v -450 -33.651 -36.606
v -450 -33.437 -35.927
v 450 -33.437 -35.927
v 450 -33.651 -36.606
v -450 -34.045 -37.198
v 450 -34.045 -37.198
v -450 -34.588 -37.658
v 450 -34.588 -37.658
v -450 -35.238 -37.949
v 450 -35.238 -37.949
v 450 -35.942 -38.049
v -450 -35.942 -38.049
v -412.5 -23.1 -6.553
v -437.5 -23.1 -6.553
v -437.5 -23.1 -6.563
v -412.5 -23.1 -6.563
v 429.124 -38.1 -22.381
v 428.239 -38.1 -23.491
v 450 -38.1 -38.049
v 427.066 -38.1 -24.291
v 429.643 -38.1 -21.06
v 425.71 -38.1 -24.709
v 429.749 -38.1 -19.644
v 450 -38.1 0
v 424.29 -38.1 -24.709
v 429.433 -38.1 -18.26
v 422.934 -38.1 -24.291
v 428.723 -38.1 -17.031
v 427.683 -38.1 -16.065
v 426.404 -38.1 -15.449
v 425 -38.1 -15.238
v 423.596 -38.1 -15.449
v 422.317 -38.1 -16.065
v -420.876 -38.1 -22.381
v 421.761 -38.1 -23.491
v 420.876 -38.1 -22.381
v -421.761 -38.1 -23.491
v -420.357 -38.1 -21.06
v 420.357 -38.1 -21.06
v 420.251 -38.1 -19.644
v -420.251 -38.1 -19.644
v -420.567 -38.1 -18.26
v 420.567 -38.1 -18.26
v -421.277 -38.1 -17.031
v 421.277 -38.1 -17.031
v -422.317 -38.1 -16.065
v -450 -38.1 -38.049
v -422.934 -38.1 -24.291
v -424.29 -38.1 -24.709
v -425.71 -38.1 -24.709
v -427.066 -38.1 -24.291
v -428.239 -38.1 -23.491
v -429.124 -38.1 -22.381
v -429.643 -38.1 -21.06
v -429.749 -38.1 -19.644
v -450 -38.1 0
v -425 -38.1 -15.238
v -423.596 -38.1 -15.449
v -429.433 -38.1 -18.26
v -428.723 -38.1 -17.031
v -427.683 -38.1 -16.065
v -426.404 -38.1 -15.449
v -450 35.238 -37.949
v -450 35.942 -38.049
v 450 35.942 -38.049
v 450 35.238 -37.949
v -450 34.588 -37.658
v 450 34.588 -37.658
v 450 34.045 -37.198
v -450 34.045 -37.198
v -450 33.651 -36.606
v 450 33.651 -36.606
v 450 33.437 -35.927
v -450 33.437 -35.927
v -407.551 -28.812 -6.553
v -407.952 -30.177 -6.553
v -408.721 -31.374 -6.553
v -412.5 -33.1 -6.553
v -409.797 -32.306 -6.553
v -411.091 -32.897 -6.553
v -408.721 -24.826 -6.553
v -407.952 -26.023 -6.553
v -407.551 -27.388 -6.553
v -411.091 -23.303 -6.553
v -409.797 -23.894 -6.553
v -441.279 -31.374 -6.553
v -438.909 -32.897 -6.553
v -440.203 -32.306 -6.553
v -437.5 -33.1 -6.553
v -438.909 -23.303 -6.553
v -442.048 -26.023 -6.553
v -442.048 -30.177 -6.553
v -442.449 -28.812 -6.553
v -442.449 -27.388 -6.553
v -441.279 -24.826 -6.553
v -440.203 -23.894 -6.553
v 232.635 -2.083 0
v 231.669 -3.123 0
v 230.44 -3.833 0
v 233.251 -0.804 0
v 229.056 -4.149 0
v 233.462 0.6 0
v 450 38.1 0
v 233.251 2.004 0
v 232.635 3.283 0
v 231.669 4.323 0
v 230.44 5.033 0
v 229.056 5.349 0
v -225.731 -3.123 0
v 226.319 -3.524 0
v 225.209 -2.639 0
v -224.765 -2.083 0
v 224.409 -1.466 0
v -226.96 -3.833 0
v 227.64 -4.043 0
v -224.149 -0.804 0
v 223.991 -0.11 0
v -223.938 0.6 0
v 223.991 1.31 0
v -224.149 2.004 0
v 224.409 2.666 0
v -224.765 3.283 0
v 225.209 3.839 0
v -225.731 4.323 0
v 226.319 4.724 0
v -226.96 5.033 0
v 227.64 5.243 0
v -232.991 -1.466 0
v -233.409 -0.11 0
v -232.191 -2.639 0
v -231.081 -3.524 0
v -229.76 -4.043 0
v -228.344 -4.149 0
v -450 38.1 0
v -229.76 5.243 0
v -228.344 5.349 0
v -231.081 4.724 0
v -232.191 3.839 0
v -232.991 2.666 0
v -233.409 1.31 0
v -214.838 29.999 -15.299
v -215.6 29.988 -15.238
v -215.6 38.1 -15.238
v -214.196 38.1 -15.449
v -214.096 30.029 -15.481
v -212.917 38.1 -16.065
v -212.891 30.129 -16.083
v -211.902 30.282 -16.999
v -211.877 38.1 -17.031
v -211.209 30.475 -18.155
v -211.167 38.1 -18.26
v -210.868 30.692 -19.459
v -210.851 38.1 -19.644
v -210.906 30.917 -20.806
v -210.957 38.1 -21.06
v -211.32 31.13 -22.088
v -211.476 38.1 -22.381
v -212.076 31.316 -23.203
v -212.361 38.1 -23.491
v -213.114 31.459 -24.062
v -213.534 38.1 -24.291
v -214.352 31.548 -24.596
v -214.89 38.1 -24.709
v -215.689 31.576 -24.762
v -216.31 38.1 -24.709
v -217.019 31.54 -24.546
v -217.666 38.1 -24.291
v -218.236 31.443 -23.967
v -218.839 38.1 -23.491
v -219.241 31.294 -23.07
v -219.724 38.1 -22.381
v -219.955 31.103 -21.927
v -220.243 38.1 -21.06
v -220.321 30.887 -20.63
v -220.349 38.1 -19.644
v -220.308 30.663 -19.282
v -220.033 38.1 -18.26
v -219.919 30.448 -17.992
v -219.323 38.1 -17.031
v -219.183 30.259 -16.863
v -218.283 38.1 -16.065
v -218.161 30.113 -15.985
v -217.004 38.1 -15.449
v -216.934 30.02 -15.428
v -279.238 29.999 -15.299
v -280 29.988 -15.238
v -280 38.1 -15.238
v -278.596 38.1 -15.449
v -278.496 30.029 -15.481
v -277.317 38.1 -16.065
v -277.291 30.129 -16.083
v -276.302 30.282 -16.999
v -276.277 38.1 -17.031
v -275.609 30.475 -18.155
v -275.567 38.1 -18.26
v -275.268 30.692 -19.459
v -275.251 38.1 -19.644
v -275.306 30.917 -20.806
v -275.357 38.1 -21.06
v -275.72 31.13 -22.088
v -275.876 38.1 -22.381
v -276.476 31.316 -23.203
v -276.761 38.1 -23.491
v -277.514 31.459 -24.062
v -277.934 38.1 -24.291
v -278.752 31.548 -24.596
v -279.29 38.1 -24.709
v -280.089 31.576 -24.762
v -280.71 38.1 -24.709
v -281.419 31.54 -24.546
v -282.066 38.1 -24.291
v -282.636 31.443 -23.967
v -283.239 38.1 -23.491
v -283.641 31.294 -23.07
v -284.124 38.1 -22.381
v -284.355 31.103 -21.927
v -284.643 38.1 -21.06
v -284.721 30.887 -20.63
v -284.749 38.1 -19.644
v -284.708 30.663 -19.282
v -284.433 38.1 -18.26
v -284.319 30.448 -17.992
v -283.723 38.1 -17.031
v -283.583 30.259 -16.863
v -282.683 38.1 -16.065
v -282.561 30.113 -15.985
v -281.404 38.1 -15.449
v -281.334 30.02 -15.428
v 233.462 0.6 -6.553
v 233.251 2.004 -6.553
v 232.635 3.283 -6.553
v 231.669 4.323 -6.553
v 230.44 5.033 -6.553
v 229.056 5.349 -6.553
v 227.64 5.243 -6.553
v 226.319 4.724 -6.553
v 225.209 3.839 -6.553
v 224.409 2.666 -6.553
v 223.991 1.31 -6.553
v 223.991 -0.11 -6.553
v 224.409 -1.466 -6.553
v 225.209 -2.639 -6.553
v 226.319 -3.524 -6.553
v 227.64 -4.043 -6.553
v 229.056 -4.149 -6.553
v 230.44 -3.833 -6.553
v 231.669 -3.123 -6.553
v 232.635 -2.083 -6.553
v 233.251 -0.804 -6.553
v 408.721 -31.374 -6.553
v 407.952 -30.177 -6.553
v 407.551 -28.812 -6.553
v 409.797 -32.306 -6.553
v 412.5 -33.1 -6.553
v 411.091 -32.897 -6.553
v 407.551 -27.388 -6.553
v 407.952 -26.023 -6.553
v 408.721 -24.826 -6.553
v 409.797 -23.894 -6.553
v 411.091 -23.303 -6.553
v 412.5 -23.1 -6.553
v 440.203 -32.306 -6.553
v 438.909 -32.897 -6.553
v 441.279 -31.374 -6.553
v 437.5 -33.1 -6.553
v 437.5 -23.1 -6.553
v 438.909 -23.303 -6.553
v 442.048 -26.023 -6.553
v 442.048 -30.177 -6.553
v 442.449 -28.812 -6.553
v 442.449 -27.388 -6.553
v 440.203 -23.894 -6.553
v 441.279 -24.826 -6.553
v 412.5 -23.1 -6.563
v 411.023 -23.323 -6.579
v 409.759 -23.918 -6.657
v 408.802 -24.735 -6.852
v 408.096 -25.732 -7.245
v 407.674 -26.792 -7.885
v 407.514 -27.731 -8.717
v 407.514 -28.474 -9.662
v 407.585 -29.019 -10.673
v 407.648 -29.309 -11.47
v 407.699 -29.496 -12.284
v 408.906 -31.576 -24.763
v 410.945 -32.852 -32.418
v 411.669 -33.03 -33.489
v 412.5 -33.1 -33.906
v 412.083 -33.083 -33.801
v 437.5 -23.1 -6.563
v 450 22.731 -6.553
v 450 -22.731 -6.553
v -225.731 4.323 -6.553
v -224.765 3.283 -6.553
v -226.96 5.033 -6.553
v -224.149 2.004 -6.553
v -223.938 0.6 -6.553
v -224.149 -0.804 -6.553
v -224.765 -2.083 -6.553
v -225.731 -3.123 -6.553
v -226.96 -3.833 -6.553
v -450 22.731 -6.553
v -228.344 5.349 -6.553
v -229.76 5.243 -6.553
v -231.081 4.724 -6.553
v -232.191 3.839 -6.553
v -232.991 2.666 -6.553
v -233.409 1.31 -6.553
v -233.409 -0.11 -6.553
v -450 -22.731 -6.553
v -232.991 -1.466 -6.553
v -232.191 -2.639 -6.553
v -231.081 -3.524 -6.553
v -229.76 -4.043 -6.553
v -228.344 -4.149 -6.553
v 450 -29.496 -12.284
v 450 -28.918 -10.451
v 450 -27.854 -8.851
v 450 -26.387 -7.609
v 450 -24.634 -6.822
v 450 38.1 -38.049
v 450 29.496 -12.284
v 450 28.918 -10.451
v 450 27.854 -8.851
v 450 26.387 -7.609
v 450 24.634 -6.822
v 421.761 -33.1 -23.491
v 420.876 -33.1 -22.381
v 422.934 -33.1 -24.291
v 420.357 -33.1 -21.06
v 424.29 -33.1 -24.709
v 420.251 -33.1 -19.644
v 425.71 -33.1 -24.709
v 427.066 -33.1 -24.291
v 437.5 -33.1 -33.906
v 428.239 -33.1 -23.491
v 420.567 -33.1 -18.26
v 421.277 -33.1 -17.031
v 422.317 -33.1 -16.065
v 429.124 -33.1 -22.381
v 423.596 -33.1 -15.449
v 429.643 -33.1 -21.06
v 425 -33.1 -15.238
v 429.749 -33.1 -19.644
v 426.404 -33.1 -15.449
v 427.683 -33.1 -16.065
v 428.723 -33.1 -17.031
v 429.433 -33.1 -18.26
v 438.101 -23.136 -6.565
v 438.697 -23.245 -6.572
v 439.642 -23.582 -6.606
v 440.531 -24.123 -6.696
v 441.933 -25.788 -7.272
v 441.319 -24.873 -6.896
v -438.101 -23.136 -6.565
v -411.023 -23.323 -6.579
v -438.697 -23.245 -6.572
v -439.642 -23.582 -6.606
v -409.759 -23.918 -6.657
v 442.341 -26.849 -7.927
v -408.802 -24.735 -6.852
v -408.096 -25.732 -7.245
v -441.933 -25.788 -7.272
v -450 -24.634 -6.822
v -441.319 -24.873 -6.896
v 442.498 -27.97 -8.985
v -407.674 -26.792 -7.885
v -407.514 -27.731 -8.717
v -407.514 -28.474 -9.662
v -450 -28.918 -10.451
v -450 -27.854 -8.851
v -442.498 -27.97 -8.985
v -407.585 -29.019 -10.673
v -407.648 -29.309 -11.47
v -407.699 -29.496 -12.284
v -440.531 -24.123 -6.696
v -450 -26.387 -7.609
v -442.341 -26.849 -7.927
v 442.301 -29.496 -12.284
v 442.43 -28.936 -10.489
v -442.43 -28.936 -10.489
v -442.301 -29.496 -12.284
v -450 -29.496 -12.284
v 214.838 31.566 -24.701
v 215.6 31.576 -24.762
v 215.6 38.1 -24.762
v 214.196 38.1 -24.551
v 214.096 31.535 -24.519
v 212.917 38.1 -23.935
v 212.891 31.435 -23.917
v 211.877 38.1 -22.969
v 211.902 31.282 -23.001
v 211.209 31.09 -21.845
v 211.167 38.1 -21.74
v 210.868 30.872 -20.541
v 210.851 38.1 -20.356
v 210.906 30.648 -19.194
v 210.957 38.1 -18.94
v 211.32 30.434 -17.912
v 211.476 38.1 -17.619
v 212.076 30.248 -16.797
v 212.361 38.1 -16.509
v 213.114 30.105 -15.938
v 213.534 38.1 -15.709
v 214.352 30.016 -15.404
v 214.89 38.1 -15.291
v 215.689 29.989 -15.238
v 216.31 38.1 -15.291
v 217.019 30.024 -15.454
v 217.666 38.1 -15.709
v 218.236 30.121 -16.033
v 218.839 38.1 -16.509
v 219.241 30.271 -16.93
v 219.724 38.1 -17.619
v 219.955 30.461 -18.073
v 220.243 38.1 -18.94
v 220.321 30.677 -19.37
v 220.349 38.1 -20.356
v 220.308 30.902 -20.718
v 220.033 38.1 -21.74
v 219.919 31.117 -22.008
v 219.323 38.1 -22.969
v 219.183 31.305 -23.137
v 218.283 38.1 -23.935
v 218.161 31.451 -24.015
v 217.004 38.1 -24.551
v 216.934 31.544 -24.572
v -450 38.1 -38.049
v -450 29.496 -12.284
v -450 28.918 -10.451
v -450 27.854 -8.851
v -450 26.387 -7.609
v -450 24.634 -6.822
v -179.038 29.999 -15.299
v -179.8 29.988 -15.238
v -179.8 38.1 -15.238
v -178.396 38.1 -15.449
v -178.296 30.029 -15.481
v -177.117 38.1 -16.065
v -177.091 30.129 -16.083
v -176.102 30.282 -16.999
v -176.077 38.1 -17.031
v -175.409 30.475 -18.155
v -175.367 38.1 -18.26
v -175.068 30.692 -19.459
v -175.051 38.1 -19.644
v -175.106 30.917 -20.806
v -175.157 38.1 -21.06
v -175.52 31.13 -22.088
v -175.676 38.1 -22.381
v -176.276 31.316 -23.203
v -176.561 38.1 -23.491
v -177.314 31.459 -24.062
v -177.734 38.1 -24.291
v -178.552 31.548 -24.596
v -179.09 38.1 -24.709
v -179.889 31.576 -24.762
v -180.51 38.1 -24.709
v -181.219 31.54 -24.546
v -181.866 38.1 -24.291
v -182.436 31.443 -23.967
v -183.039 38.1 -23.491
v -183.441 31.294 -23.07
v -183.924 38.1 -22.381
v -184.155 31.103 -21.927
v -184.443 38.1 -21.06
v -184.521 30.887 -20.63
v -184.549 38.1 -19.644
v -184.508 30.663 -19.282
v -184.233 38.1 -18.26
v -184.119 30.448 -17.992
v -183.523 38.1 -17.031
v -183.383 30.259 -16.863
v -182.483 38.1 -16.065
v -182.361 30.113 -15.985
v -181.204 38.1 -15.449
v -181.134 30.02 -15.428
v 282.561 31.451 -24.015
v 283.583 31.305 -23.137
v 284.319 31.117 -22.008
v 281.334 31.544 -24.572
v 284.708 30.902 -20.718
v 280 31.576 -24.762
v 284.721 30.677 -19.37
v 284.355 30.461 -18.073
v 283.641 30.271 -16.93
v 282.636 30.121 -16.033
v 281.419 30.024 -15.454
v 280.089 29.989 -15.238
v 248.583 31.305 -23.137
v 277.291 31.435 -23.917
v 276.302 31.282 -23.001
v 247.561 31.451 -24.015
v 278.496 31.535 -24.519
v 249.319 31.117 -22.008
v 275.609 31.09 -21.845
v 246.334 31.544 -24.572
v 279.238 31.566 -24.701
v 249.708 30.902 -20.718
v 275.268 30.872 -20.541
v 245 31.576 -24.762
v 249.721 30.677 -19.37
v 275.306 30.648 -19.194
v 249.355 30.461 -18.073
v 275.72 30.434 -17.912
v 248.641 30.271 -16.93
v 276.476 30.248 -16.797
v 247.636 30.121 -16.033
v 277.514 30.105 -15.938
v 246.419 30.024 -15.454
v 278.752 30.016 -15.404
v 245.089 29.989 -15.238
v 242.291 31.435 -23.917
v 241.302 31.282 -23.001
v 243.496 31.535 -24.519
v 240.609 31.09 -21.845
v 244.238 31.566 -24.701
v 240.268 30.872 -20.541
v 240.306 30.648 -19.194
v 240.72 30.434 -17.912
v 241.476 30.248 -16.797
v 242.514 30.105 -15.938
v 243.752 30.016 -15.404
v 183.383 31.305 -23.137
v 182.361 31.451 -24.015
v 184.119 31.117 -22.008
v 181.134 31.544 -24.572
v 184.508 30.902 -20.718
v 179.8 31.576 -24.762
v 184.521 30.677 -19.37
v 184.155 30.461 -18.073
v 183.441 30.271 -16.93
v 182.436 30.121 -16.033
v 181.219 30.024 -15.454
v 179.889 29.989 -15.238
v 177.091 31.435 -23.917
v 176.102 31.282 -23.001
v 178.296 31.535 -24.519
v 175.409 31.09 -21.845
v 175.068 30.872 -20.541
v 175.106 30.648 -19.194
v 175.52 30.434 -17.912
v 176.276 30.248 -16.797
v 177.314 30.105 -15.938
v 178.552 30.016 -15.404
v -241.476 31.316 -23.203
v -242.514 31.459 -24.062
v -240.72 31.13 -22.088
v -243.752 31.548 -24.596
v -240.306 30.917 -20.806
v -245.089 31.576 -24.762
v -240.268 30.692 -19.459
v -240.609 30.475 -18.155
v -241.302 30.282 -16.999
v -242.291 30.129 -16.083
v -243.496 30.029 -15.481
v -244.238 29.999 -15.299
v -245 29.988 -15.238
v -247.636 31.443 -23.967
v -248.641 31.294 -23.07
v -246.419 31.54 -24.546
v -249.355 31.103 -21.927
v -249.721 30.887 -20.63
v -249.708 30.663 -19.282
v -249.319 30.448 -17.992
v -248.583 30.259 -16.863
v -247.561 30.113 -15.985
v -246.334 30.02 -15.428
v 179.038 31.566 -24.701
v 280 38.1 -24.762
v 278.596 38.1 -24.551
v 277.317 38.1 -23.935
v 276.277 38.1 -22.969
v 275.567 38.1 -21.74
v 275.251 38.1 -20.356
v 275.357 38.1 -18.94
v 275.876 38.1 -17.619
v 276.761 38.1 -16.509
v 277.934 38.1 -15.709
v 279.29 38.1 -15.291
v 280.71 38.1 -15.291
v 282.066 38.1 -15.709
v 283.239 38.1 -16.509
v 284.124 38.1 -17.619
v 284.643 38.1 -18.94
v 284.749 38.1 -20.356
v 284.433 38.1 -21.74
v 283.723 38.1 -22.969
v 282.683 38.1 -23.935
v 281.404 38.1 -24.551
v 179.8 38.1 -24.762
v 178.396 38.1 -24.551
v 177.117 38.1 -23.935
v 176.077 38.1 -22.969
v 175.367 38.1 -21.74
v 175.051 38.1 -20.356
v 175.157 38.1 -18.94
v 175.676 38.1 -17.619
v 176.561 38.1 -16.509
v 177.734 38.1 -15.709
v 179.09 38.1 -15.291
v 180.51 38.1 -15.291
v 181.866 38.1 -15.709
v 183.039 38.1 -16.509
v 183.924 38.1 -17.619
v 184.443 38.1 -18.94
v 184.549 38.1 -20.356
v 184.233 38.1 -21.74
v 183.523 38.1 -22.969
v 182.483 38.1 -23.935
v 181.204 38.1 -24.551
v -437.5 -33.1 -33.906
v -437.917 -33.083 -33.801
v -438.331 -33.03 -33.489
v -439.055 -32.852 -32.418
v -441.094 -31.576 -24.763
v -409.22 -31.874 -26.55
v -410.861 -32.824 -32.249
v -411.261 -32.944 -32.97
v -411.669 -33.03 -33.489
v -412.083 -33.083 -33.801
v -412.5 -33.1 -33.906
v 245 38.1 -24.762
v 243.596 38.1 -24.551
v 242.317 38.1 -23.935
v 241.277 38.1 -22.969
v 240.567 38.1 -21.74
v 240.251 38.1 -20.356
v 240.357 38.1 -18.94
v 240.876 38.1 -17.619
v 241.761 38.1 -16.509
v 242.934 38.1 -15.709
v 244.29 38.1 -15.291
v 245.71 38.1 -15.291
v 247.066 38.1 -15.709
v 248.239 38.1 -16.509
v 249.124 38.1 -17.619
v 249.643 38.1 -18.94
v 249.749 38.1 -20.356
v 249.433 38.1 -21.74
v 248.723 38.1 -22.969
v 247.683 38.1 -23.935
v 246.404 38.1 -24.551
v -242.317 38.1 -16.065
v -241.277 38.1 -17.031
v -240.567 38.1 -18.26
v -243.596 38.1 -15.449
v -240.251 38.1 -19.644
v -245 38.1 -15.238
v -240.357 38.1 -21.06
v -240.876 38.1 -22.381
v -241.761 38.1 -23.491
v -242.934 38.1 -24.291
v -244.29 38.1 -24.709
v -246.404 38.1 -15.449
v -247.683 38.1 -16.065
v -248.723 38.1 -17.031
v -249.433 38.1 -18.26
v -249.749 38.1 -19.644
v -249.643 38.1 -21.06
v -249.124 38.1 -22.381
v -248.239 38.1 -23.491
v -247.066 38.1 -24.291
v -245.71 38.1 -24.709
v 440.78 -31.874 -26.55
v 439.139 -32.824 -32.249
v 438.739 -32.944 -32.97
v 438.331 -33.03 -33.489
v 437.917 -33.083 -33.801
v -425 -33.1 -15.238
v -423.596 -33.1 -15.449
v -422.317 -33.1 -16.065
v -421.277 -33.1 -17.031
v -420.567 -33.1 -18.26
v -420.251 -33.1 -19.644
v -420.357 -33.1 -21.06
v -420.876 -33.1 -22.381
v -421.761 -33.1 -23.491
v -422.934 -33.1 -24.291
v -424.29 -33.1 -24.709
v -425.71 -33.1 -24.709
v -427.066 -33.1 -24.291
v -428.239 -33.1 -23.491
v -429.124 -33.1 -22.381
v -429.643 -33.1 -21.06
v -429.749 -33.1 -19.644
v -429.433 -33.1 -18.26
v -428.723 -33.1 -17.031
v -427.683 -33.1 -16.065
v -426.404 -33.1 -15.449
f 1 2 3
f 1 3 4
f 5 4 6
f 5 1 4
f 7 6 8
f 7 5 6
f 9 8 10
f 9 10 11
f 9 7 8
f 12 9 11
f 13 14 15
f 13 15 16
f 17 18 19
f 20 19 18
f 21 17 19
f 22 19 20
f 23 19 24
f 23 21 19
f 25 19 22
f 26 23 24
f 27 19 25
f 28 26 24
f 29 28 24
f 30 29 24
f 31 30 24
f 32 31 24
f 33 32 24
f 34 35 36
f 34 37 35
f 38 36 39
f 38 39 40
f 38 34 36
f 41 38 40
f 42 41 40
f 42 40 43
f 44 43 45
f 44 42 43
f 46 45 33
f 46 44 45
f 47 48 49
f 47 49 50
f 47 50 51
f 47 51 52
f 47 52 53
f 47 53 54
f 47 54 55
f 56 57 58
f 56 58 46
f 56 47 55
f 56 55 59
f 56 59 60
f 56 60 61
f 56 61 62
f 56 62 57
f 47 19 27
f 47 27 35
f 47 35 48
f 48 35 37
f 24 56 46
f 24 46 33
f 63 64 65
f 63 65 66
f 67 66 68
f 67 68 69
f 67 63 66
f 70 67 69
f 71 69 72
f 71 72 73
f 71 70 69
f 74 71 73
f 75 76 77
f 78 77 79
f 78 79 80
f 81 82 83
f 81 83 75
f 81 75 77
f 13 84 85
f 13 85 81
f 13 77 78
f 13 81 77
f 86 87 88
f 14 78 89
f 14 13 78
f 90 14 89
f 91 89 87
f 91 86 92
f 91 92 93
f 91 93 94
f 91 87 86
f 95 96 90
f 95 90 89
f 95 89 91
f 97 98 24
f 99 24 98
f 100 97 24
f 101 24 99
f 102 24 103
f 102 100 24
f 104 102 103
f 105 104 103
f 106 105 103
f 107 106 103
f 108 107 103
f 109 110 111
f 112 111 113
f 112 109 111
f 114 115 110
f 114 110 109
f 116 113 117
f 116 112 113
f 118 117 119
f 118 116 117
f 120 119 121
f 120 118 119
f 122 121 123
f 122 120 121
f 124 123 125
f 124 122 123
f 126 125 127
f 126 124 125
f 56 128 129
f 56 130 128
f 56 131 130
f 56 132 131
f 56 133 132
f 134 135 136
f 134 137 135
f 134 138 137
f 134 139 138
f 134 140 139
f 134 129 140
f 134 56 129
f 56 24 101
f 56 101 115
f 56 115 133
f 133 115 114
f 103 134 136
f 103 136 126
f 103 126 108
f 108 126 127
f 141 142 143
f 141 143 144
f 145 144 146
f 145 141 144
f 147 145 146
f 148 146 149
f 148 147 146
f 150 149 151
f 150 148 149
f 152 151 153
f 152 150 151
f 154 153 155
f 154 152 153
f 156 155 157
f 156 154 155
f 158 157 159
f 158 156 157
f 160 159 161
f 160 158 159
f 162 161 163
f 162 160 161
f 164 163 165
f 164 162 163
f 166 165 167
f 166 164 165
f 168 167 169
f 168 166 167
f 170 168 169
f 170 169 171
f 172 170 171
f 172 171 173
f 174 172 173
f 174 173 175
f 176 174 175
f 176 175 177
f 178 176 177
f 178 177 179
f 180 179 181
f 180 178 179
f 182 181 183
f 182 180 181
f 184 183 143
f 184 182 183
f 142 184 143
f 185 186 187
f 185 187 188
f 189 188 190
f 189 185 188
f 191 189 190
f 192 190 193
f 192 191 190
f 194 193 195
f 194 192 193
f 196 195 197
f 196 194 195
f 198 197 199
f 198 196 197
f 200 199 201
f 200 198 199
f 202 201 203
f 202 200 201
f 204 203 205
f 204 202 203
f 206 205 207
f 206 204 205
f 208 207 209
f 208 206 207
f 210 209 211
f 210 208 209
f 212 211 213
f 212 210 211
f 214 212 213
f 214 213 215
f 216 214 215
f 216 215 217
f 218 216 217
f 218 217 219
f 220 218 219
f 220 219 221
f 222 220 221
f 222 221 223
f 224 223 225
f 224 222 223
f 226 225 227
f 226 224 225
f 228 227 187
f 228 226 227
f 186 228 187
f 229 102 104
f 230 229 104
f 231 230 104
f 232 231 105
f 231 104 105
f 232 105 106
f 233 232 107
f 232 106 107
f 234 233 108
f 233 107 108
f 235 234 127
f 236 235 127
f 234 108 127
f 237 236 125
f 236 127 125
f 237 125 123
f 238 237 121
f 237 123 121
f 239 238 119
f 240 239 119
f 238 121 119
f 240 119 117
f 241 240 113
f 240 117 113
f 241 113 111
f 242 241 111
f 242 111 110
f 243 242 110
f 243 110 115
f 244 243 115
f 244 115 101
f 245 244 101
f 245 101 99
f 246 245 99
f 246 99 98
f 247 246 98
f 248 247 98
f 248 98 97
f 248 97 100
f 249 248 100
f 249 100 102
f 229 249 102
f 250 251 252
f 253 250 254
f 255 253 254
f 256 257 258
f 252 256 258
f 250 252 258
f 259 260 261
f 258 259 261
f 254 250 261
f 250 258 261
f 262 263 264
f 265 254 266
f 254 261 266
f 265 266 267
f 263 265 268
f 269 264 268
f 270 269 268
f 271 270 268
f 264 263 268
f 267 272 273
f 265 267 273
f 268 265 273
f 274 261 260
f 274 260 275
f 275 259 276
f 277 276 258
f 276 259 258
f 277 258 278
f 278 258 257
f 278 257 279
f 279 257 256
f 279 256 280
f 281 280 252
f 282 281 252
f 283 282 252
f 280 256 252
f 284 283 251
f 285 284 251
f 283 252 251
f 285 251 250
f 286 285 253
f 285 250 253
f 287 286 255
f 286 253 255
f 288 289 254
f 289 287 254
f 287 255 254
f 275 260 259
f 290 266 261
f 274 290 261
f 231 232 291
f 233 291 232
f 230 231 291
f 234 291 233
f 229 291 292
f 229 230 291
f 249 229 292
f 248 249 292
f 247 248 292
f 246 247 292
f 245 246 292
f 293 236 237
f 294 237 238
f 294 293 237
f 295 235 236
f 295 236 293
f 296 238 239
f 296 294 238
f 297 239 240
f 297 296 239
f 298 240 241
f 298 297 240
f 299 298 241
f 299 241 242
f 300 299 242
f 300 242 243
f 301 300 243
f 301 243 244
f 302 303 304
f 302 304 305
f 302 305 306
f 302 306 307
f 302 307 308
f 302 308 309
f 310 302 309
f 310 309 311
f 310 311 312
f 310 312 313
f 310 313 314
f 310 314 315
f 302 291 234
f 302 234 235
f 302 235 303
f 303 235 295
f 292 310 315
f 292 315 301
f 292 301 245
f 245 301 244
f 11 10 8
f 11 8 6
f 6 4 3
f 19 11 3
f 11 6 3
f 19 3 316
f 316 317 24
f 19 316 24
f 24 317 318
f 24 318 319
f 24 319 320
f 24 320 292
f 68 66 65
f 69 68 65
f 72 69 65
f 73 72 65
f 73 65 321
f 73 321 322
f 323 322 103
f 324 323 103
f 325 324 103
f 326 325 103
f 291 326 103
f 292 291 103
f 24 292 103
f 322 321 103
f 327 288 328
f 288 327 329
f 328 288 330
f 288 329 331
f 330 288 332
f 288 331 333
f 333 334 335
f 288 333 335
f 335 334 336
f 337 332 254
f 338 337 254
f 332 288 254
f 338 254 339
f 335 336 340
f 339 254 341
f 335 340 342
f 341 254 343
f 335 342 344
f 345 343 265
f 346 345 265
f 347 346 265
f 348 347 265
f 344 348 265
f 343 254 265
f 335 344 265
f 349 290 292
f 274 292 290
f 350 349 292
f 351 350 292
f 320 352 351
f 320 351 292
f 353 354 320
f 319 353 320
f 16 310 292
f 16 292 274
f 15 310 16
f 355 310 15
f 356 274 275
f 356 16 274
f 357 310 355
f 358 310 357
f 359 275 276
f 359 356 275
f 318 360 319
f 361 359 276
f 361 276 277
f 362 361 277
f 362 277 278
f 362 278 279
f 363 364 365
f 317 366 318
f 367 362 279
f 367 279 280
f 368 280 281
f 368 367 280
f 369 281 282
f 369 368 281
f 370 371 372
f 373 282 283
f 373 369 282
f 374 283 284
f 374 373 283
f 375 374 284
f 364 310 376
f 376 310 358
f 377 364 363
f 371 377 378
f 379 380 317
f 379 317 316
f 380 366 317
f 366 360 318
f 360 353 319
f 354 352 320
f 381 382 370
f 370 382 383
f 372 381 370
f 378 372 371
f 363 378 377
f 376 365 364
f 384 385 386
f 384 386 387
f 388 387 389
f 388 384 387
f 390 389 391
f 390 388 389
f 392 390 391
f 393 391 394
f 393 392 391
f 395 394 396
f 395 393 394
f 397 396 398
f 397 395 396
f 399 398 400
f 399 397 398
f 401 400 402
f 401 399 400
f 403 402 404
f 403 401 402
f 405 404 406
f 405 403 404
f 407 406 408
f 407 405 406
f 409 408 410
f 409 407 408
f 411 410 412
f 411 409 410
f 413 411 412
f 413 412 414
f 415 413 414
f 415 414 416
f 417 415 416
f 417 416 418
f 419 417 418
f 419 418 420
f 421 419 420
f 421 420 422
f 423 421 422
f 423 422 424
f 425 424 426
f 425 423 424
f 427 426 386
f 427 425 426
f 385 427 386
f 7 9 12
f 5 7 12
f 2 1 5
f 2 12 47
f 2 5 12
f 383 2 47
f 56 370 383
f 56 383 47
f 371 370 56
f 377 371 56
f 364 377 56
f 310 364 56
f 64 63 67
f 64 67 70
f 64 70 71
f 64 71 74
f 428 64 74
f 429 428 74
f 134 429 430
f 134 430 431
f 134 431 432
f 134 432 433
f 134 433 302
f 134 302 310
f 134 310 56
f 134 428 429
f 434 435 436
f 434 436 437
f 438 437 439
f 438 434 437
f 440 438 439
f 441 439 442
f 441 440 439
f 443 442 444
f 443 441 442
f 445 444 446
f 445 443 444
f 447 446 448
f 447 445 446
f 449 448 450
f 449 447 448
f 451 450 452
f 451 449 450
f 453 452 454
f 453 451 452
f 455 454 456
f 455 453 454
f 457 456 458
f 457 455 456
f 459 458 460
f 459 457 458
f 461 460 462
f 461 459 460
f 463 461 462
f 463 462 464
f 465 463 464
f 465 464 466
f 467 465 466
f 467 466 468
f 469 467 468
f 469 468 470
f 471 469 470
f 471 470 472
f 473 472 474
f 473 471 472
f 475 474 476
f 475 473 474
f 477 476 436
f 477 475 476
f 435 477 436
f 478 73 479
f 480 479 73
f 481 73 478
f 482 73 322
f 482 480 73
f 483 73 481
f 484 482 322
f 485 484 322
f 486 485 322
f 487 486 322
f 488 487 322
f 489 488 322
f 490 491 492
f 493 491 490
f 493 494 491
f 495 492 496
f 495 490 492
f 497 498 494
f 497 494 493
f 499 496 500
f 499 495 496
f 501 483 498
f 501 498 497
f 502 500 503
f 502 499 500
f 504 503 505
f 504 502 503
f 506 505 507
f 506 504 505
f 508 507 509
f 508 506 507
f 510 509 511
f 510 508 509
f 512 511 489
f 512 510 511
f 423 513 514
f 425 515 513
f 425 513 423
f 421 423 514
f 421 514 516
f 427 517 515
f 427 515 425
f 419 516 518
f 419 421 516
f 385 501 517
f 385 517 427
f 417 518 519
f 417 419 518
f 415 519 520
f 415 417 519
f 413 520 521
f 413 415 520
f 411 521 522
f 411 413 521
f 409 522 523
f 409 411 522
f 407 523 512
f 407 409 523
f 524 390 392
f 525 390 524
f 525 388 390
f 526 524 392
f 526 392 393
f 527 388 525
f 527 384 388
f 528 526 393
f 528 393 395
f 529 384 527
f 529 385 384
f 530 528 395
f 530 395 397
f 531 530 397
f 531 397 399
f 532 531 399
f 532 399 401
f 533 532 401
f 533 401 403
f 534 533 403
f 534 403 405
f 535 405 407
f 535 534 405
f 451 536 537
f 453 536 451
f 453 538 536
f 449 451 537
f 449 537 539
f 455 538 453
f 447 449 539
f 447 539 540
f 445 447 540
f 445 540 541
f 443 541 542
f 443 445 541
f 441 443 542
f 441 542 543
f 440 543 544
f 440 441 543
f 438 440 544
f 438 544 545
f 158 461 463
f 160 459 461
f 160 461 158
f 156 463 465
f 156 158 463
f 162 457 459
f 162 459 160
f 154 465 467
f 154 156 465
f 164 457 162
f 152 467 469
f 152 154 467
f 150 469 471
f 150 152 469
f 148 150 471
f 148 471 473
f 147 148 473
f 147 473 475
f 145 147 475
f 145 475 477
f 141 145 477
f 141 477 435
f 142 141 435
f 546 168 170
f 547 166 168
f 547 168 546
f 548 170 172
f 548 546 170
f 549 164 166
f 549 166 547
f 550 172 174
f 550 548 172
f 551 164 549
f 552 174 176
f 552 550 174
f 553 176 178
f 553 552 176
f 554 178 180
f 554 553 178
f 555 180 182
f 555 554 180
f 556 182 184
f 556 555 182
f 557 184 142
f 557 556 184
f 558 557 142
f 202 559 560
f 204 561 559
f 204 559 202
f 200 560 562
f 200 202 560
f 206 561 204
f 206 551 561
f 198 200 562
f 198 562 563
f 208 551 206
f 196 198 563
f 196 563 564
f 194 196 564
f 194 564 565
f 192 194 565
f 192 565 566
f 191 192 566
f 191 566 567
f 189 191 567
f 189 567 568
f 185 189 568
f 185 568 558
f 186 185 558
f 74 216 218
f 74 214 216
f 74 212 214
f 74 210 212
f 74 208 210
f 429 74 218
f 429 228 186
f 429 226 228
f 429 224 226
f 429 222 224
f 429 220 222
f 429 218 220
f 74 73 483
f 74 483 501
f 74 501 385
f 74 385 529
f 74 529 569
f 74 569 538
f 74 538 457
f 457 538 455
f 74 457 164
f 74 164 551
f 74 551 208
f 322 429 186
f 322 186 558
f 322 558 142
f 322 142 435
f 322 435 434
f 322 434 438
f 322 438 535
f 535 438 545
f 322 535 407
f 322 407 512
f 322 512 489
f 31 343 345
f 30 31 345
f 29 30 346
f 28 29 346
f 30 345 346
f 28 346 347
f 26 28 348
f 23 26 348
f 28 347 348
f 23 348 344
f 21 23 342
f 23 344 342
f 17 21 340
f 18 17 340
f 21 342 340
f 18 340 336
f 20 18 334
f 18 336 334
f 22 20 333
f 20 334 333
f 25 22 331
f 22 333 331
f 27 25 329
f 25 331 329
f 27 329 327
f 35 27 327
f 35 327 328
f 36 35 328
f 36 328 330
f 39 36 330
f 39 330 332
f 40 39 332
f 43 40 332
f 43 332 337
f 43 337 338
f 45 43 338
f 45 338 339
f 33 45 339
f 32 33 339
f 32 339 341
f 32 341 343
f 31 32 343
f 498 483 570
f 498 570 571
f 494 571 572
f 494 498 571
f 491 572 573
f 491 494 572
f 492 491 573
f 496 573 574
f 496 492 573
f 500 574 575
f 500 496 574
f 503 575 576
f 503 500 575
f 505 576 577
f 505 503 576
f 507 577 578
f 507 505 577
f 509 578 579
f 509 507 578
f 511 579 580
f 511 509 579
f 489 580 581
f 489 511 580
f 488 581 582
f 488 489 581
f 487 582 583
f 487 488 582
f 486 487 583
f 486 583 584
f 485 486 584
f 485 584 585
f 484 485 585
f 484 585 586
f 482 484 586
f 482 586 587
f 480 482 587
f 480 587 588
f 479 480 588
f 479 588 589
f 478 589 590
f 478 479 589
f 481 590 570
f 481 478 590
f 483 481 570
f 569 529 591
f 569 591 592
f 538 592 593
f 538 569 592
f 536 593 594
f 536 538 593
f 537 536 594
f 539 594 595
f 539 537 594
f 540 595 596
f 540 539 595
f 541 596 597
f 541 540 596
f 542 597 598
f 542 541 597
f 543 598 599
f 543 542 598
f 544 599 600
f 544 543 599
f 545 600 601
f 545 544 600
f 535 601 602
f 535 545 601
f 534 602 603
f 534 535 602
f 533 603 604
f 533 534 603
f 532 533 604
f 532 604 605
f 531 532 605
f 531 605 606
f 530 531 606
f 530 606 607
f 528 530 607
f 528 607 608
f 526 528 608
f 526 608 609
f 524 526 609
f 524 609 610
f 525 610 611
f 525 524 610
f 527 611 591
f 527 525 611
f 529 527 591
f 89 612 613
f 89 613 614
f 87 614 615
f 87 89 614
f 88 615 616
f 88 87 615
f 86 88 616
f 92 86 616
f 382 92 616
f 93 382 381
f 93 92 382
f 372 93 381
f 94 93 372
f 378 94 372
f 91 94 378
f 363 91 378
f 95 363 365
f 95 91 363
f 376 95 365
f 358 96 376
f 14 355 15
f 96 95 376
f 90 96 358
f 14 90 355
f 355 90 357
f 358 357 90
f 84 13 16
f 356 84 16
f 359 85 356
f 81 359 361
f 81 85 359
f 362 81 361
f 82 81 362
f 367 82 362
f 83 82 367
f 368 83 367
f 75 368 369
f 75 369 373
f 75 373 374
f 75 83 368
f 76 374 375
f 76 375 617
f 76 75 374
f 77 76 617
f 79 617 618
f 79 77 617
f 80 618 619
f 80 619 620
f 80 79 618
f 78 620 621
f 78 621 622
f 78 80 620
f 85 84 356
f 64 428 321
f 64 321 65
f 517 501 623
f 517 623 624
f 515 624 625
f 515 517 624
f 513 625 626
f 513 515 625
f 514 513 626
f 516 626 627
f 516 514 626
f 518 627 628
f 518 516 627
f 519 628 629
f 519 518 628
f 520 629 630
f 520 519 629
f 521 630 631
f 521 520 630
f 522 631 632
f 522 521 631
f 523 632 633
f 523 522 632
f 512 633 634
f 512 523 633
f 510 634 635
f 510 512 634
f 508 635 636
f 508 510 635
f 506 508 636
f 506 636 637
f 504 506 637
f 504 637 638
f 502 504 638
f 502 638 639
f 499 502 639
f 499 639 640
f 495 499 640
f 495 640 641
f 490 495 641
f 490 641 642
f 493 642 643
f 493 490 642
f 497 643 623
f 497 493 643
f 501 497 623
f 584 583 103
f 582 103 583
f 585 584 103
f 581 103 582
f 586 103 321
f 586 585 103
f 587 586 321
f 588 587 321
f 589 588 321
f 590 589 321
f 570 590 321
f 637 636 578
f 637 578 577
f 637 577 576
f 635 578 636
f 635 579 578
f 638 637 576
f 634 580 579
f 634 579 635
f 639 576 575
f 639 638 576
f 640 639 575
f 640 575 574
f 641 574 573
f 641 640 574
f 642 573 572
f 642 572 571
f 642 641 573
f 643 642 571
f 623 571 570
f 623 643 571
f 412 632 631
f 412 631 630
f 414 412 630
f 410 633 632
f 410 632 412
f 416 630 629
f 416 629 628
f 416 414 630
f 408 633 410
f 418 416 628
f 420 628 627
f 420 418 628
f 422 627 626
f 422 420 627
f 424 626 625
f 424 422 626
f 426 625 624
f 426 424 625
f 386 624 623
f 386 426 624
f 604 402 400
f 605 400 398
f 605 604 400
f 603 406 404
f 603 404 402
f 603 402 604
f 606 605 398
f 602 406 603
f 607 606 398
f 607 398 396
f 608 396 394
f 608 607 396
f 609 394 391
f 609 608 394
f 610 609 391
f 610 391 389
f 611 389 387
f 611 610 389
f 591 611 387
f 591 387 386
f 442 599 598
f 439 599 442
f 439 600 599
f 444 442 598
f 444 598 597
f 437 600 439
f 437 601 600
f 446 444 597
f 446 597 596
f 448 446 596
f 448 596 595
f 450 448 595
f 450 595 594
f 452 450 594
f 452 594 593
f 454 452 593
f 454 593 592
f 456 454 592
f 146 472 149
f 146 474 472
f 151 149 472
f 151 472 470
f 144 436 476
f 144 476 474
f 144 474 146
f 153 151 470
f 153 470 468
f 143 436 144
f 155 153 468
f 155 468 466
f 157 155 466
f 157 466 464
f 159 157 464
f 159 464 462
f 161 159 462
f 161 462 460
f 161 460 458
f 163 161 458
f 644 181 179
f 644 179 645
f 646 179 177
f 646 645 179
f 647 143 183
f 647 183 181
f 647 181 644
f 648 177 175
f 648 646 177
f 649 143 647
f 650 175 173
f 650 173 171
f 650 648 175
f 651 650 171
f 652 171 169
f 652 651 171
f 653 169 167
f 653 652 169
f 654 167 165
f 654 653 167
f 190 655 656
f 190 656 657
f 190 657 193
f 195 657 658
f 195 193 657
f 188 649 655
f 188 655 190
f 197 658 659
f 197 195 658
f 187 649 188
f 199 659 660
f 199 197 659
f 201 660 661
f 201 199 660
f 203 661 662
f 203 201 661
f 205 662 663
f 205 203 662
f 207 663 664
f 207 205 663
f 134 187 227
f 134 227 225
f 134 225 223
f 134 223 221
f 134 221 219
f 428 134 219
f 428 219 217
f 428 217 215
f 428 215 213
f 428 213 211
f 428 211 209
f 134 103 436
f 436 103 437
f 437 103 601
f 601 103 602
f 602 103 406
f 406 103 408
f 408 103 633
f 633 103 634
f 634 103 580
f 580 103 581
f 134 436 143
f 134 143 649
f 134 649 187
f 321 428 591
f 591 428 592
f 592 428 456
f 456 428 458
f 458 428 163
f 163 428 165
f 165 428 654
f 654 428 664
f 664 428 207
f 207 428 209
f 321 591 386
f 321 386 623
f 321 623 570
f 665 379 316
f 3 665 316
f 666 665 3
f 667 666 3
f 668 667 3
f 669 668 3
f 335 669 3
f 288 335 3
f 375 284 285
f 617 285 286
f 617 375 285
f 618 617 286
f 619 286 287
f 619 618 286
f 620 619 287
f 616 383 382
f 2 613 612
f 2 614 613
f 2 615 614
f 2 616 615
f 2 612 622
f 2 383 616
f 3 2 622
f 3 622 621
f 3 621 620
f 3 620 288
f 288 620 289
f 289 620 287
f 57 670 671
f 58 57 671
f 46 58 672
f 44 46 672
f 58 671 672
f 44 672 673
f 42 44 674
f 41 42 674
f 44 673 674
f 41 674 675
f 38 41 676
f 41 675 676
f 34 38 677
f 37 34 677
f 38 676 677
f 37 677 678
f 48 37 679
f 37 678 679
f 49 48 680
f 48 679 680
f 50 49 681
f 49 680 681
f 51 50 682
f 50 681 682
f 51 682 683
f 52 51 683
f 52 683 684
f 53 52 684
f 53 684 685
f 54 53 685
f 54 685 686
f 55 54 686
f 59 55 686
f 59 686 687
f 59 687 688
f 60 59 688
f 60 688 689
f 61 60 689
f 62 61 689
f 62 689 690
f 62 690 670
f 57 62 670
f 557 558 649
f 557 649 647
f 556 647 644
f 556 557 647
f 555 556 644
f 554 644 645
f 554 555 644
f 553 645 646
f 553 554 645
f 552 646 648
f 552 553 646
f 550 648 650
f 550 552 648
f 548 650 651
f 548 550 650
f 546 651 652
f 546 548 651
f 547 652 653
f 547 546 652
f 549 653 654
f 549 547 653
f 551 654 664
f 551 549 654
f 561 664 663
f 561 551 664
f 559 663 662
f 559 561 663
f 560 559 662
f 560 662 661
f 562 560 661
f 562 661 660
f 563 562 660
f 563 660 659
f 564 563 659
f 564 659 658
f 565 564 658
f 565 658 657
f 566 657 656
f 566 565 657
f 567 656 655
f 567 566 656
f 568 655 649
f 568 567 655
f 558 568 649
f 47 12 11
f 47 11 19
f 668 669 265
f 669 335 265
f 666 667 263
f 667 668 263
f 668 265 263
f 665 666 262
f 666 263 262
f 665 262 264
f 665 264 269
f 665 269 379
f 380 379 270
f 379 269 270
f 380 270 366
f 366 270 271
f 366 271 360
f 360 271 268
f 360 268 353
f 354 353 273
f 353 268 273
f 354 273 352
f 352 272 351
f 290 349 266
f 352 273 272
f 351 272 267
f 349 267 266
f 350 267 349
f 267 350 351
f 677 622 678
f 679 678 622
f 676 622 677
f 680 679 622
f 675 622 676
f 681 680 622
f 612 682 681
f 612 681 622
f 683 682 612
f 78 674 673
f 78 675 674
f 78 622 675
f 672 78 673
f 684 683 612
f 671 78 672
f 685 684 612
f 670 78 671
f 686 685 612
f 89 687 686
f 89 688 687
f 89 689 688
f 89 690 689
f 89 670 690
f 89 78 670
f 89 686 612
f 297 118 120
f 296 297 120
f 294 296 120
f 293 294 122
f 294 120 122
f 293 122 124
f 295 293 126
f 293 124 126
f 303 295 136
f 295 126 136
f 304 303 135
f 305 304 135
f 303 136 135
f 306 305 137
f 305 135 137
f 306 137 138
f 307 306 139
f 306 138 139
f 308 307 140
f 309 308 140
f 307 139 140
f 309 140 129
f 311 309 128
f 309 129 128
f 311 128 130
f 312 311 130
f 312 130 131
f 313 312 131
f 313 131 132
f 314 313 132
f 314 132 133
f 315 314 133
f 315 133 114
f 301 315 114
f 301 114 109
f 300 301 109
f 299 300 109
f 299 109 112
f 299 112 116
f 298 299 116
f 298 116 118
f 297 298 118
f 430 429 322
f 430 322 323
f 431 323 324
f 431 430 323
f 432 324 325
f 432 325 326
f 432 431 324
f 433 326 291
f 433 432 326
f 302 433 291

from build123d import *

# Parameters (mm, degrees)
STRUCTURAL_MEMBER1_DEPTH = 900
SKETCH12_R               = 4.7625
CUT_EXTRUDE1_DEPTH       = 454.210052427
CUT_EXTRUDE2_DEPTH       = 40
SKETCH16_R               = 4.7625
CUT_EXTRUDE3_DEPTH       = 454.210052526
SKETCH17_R               = 4.7625
CUT_EXTRUDE4_DEPTH       = 454.210052526


with BuildPart() as part:
    # Sketch11 → Structural Member1 (new body)
    with BuildSketch(Plane(origin=(-450, 0, 0), x_dir=(0, 0, -1), z_dir=(1, 0, 0))):
        with BuildLine():
            Line((0, -38.1), (0, 38.1))
            Line((0, 38.1), (38.0492, 38.1))
            Line((38.0492, 38.1), (38.0492, 35.942335136))
            ThreePointArc((38.0492, 35.942335136), (37.447280466, 34.300554363), (35.926803066, 33.436899509))
            Line((35.926803066, 33.436899509), (12.283671721, 29.496090157))
            ThreePointArc((12.283671721, 29.496090157), (8.178382741, 27.164222052), (6.5532, 22.731413966))
            Line((6.5532, 22.731413966), (6.5532, -22.731413966))
            ThreePointArc((6.5532, -22.731413966), (8.178382741, -27.164222052), (12.283671721, -29.496090157))
            Line((12.283671721, -29.496090157), (35.926803066, -33.436899509))
            ThreePointArc((35.926803066, -33.436899509), (37.447280466, -34.300554363), (38.0492, -35.942335136))
            Line((38.0492, -35.942335136), (38.0492, -38.1))
            Line((38.0492, -38.1), (0, -38.1))
        make_face()
    extrude(amount=STRUCTURAL_MEMBER1_DEPTH)

    # Sketch12 → Cut-Extrude1 (cut, through all)
    with BuildSketch(Plane(origin=(0, 0, 0), x_dir=(1, 0, 0), z_dir=(0, 1, 0))):
        with Locations(Location((-425, 20, 0), (0, 0, 270))):
            Circle(SKETCH12_R)
        with Locations(Location((425, 20, 0), (0, 0, 270))):
            Circle(SKETCH12_R)
    extrude(amount=-CUT_EXTRUDE1_DEPTH, mode=Mode.SUBTRACT)

    # Sketch15 → Cut-Extrude2 (cut)
    with BuildSketch(Plane(origin=(0, 0, -6.5532), x_dir=(-1, 0, 0), z_dir=(0, 0, -1))):
        with BuildLine():
            Line((-412.5, -33.1), (-437.5, -33.1))
            ThreePointArc((-437.5, -33.1), (-442.5, -28.1), (-437.5, -23.1))
            Line((-437.5, -23.1), (-412.5, -23.1))
            ThreePointArc((-412.5, -23.1), (-407.5, -28.1), (-412.5, -33.1))
        make_face()
        with BuildLine():
            Line((412.5, -33.1), (437.5, -33.1))
            ThreePointArc((437.5, -33.1), (442.5, -28.1), (437.5, -23.1))
            Line((437.5, -23.1), (412.5, -23.1))
            ThreePointArc((412.5, -23.1), (407.5, -28.1), (412.5, -33.1))
        make_face()
    extrude(amount=CUT_EXTRUDE2_DEPTH, mode=Mode.SUBTRACT)

    # Sketch16 → Cut-Extrude3 (cut, through all)
    with BuildSketch(Plane(origin=(0, 0, 0), x_dir=(1, 0, 0), z_dir=(0, 1, 0))):
        with Locations(Location((-215.6, 20, 0), (0, 0, 270))):
            Circle(SKETCH16_R)
        with Locations(Location((-179.8, 20, 0), (0, 0, 270))):
            Circle(SKETCH16_R)
        with Locations(Location((179.8, 20, 0), (0, 0, 90))):
            Circle(SKETCH16_R)
        with Locations(Location((215.6, 20, 0), (0, 0, 90))):
            Circle(SKETCH16_R)
        with Locations(Location((-245, 20, 0), (0, 0, 270))):
            Circle(SKETCH16_R)
        with Locations(Location((-280, 20, 0), (0, 0, 270))):
            Circle(SKETCH16_R)
        with Locations(Location((245, 20, 0), (0, 0, 90))):
            Circle(SKETCH16_R)
        with Locations(Location((280, 20, 0), (0, 0, 90))):
            Circle(SKETCH16_R)
    extrude(amount=CUT_EXTRUDE3_DEPTH, mode=Mode.SUBTRACT)

    # Sketch17 → Cut-Extrude4 (cut, through all)
    with BuildSketch(Plane.XY):
        with Locations((228.7, 0.6)):
            Circle(SKETCH17_R)
        with Locations((-228.7, 0.6)):
            Circle(SKETCH17_R)
    extrude(amount=-CUT_EXTRUDE4_DEPTH, mode=Mode.SUBTRACT)


solid = part.part
